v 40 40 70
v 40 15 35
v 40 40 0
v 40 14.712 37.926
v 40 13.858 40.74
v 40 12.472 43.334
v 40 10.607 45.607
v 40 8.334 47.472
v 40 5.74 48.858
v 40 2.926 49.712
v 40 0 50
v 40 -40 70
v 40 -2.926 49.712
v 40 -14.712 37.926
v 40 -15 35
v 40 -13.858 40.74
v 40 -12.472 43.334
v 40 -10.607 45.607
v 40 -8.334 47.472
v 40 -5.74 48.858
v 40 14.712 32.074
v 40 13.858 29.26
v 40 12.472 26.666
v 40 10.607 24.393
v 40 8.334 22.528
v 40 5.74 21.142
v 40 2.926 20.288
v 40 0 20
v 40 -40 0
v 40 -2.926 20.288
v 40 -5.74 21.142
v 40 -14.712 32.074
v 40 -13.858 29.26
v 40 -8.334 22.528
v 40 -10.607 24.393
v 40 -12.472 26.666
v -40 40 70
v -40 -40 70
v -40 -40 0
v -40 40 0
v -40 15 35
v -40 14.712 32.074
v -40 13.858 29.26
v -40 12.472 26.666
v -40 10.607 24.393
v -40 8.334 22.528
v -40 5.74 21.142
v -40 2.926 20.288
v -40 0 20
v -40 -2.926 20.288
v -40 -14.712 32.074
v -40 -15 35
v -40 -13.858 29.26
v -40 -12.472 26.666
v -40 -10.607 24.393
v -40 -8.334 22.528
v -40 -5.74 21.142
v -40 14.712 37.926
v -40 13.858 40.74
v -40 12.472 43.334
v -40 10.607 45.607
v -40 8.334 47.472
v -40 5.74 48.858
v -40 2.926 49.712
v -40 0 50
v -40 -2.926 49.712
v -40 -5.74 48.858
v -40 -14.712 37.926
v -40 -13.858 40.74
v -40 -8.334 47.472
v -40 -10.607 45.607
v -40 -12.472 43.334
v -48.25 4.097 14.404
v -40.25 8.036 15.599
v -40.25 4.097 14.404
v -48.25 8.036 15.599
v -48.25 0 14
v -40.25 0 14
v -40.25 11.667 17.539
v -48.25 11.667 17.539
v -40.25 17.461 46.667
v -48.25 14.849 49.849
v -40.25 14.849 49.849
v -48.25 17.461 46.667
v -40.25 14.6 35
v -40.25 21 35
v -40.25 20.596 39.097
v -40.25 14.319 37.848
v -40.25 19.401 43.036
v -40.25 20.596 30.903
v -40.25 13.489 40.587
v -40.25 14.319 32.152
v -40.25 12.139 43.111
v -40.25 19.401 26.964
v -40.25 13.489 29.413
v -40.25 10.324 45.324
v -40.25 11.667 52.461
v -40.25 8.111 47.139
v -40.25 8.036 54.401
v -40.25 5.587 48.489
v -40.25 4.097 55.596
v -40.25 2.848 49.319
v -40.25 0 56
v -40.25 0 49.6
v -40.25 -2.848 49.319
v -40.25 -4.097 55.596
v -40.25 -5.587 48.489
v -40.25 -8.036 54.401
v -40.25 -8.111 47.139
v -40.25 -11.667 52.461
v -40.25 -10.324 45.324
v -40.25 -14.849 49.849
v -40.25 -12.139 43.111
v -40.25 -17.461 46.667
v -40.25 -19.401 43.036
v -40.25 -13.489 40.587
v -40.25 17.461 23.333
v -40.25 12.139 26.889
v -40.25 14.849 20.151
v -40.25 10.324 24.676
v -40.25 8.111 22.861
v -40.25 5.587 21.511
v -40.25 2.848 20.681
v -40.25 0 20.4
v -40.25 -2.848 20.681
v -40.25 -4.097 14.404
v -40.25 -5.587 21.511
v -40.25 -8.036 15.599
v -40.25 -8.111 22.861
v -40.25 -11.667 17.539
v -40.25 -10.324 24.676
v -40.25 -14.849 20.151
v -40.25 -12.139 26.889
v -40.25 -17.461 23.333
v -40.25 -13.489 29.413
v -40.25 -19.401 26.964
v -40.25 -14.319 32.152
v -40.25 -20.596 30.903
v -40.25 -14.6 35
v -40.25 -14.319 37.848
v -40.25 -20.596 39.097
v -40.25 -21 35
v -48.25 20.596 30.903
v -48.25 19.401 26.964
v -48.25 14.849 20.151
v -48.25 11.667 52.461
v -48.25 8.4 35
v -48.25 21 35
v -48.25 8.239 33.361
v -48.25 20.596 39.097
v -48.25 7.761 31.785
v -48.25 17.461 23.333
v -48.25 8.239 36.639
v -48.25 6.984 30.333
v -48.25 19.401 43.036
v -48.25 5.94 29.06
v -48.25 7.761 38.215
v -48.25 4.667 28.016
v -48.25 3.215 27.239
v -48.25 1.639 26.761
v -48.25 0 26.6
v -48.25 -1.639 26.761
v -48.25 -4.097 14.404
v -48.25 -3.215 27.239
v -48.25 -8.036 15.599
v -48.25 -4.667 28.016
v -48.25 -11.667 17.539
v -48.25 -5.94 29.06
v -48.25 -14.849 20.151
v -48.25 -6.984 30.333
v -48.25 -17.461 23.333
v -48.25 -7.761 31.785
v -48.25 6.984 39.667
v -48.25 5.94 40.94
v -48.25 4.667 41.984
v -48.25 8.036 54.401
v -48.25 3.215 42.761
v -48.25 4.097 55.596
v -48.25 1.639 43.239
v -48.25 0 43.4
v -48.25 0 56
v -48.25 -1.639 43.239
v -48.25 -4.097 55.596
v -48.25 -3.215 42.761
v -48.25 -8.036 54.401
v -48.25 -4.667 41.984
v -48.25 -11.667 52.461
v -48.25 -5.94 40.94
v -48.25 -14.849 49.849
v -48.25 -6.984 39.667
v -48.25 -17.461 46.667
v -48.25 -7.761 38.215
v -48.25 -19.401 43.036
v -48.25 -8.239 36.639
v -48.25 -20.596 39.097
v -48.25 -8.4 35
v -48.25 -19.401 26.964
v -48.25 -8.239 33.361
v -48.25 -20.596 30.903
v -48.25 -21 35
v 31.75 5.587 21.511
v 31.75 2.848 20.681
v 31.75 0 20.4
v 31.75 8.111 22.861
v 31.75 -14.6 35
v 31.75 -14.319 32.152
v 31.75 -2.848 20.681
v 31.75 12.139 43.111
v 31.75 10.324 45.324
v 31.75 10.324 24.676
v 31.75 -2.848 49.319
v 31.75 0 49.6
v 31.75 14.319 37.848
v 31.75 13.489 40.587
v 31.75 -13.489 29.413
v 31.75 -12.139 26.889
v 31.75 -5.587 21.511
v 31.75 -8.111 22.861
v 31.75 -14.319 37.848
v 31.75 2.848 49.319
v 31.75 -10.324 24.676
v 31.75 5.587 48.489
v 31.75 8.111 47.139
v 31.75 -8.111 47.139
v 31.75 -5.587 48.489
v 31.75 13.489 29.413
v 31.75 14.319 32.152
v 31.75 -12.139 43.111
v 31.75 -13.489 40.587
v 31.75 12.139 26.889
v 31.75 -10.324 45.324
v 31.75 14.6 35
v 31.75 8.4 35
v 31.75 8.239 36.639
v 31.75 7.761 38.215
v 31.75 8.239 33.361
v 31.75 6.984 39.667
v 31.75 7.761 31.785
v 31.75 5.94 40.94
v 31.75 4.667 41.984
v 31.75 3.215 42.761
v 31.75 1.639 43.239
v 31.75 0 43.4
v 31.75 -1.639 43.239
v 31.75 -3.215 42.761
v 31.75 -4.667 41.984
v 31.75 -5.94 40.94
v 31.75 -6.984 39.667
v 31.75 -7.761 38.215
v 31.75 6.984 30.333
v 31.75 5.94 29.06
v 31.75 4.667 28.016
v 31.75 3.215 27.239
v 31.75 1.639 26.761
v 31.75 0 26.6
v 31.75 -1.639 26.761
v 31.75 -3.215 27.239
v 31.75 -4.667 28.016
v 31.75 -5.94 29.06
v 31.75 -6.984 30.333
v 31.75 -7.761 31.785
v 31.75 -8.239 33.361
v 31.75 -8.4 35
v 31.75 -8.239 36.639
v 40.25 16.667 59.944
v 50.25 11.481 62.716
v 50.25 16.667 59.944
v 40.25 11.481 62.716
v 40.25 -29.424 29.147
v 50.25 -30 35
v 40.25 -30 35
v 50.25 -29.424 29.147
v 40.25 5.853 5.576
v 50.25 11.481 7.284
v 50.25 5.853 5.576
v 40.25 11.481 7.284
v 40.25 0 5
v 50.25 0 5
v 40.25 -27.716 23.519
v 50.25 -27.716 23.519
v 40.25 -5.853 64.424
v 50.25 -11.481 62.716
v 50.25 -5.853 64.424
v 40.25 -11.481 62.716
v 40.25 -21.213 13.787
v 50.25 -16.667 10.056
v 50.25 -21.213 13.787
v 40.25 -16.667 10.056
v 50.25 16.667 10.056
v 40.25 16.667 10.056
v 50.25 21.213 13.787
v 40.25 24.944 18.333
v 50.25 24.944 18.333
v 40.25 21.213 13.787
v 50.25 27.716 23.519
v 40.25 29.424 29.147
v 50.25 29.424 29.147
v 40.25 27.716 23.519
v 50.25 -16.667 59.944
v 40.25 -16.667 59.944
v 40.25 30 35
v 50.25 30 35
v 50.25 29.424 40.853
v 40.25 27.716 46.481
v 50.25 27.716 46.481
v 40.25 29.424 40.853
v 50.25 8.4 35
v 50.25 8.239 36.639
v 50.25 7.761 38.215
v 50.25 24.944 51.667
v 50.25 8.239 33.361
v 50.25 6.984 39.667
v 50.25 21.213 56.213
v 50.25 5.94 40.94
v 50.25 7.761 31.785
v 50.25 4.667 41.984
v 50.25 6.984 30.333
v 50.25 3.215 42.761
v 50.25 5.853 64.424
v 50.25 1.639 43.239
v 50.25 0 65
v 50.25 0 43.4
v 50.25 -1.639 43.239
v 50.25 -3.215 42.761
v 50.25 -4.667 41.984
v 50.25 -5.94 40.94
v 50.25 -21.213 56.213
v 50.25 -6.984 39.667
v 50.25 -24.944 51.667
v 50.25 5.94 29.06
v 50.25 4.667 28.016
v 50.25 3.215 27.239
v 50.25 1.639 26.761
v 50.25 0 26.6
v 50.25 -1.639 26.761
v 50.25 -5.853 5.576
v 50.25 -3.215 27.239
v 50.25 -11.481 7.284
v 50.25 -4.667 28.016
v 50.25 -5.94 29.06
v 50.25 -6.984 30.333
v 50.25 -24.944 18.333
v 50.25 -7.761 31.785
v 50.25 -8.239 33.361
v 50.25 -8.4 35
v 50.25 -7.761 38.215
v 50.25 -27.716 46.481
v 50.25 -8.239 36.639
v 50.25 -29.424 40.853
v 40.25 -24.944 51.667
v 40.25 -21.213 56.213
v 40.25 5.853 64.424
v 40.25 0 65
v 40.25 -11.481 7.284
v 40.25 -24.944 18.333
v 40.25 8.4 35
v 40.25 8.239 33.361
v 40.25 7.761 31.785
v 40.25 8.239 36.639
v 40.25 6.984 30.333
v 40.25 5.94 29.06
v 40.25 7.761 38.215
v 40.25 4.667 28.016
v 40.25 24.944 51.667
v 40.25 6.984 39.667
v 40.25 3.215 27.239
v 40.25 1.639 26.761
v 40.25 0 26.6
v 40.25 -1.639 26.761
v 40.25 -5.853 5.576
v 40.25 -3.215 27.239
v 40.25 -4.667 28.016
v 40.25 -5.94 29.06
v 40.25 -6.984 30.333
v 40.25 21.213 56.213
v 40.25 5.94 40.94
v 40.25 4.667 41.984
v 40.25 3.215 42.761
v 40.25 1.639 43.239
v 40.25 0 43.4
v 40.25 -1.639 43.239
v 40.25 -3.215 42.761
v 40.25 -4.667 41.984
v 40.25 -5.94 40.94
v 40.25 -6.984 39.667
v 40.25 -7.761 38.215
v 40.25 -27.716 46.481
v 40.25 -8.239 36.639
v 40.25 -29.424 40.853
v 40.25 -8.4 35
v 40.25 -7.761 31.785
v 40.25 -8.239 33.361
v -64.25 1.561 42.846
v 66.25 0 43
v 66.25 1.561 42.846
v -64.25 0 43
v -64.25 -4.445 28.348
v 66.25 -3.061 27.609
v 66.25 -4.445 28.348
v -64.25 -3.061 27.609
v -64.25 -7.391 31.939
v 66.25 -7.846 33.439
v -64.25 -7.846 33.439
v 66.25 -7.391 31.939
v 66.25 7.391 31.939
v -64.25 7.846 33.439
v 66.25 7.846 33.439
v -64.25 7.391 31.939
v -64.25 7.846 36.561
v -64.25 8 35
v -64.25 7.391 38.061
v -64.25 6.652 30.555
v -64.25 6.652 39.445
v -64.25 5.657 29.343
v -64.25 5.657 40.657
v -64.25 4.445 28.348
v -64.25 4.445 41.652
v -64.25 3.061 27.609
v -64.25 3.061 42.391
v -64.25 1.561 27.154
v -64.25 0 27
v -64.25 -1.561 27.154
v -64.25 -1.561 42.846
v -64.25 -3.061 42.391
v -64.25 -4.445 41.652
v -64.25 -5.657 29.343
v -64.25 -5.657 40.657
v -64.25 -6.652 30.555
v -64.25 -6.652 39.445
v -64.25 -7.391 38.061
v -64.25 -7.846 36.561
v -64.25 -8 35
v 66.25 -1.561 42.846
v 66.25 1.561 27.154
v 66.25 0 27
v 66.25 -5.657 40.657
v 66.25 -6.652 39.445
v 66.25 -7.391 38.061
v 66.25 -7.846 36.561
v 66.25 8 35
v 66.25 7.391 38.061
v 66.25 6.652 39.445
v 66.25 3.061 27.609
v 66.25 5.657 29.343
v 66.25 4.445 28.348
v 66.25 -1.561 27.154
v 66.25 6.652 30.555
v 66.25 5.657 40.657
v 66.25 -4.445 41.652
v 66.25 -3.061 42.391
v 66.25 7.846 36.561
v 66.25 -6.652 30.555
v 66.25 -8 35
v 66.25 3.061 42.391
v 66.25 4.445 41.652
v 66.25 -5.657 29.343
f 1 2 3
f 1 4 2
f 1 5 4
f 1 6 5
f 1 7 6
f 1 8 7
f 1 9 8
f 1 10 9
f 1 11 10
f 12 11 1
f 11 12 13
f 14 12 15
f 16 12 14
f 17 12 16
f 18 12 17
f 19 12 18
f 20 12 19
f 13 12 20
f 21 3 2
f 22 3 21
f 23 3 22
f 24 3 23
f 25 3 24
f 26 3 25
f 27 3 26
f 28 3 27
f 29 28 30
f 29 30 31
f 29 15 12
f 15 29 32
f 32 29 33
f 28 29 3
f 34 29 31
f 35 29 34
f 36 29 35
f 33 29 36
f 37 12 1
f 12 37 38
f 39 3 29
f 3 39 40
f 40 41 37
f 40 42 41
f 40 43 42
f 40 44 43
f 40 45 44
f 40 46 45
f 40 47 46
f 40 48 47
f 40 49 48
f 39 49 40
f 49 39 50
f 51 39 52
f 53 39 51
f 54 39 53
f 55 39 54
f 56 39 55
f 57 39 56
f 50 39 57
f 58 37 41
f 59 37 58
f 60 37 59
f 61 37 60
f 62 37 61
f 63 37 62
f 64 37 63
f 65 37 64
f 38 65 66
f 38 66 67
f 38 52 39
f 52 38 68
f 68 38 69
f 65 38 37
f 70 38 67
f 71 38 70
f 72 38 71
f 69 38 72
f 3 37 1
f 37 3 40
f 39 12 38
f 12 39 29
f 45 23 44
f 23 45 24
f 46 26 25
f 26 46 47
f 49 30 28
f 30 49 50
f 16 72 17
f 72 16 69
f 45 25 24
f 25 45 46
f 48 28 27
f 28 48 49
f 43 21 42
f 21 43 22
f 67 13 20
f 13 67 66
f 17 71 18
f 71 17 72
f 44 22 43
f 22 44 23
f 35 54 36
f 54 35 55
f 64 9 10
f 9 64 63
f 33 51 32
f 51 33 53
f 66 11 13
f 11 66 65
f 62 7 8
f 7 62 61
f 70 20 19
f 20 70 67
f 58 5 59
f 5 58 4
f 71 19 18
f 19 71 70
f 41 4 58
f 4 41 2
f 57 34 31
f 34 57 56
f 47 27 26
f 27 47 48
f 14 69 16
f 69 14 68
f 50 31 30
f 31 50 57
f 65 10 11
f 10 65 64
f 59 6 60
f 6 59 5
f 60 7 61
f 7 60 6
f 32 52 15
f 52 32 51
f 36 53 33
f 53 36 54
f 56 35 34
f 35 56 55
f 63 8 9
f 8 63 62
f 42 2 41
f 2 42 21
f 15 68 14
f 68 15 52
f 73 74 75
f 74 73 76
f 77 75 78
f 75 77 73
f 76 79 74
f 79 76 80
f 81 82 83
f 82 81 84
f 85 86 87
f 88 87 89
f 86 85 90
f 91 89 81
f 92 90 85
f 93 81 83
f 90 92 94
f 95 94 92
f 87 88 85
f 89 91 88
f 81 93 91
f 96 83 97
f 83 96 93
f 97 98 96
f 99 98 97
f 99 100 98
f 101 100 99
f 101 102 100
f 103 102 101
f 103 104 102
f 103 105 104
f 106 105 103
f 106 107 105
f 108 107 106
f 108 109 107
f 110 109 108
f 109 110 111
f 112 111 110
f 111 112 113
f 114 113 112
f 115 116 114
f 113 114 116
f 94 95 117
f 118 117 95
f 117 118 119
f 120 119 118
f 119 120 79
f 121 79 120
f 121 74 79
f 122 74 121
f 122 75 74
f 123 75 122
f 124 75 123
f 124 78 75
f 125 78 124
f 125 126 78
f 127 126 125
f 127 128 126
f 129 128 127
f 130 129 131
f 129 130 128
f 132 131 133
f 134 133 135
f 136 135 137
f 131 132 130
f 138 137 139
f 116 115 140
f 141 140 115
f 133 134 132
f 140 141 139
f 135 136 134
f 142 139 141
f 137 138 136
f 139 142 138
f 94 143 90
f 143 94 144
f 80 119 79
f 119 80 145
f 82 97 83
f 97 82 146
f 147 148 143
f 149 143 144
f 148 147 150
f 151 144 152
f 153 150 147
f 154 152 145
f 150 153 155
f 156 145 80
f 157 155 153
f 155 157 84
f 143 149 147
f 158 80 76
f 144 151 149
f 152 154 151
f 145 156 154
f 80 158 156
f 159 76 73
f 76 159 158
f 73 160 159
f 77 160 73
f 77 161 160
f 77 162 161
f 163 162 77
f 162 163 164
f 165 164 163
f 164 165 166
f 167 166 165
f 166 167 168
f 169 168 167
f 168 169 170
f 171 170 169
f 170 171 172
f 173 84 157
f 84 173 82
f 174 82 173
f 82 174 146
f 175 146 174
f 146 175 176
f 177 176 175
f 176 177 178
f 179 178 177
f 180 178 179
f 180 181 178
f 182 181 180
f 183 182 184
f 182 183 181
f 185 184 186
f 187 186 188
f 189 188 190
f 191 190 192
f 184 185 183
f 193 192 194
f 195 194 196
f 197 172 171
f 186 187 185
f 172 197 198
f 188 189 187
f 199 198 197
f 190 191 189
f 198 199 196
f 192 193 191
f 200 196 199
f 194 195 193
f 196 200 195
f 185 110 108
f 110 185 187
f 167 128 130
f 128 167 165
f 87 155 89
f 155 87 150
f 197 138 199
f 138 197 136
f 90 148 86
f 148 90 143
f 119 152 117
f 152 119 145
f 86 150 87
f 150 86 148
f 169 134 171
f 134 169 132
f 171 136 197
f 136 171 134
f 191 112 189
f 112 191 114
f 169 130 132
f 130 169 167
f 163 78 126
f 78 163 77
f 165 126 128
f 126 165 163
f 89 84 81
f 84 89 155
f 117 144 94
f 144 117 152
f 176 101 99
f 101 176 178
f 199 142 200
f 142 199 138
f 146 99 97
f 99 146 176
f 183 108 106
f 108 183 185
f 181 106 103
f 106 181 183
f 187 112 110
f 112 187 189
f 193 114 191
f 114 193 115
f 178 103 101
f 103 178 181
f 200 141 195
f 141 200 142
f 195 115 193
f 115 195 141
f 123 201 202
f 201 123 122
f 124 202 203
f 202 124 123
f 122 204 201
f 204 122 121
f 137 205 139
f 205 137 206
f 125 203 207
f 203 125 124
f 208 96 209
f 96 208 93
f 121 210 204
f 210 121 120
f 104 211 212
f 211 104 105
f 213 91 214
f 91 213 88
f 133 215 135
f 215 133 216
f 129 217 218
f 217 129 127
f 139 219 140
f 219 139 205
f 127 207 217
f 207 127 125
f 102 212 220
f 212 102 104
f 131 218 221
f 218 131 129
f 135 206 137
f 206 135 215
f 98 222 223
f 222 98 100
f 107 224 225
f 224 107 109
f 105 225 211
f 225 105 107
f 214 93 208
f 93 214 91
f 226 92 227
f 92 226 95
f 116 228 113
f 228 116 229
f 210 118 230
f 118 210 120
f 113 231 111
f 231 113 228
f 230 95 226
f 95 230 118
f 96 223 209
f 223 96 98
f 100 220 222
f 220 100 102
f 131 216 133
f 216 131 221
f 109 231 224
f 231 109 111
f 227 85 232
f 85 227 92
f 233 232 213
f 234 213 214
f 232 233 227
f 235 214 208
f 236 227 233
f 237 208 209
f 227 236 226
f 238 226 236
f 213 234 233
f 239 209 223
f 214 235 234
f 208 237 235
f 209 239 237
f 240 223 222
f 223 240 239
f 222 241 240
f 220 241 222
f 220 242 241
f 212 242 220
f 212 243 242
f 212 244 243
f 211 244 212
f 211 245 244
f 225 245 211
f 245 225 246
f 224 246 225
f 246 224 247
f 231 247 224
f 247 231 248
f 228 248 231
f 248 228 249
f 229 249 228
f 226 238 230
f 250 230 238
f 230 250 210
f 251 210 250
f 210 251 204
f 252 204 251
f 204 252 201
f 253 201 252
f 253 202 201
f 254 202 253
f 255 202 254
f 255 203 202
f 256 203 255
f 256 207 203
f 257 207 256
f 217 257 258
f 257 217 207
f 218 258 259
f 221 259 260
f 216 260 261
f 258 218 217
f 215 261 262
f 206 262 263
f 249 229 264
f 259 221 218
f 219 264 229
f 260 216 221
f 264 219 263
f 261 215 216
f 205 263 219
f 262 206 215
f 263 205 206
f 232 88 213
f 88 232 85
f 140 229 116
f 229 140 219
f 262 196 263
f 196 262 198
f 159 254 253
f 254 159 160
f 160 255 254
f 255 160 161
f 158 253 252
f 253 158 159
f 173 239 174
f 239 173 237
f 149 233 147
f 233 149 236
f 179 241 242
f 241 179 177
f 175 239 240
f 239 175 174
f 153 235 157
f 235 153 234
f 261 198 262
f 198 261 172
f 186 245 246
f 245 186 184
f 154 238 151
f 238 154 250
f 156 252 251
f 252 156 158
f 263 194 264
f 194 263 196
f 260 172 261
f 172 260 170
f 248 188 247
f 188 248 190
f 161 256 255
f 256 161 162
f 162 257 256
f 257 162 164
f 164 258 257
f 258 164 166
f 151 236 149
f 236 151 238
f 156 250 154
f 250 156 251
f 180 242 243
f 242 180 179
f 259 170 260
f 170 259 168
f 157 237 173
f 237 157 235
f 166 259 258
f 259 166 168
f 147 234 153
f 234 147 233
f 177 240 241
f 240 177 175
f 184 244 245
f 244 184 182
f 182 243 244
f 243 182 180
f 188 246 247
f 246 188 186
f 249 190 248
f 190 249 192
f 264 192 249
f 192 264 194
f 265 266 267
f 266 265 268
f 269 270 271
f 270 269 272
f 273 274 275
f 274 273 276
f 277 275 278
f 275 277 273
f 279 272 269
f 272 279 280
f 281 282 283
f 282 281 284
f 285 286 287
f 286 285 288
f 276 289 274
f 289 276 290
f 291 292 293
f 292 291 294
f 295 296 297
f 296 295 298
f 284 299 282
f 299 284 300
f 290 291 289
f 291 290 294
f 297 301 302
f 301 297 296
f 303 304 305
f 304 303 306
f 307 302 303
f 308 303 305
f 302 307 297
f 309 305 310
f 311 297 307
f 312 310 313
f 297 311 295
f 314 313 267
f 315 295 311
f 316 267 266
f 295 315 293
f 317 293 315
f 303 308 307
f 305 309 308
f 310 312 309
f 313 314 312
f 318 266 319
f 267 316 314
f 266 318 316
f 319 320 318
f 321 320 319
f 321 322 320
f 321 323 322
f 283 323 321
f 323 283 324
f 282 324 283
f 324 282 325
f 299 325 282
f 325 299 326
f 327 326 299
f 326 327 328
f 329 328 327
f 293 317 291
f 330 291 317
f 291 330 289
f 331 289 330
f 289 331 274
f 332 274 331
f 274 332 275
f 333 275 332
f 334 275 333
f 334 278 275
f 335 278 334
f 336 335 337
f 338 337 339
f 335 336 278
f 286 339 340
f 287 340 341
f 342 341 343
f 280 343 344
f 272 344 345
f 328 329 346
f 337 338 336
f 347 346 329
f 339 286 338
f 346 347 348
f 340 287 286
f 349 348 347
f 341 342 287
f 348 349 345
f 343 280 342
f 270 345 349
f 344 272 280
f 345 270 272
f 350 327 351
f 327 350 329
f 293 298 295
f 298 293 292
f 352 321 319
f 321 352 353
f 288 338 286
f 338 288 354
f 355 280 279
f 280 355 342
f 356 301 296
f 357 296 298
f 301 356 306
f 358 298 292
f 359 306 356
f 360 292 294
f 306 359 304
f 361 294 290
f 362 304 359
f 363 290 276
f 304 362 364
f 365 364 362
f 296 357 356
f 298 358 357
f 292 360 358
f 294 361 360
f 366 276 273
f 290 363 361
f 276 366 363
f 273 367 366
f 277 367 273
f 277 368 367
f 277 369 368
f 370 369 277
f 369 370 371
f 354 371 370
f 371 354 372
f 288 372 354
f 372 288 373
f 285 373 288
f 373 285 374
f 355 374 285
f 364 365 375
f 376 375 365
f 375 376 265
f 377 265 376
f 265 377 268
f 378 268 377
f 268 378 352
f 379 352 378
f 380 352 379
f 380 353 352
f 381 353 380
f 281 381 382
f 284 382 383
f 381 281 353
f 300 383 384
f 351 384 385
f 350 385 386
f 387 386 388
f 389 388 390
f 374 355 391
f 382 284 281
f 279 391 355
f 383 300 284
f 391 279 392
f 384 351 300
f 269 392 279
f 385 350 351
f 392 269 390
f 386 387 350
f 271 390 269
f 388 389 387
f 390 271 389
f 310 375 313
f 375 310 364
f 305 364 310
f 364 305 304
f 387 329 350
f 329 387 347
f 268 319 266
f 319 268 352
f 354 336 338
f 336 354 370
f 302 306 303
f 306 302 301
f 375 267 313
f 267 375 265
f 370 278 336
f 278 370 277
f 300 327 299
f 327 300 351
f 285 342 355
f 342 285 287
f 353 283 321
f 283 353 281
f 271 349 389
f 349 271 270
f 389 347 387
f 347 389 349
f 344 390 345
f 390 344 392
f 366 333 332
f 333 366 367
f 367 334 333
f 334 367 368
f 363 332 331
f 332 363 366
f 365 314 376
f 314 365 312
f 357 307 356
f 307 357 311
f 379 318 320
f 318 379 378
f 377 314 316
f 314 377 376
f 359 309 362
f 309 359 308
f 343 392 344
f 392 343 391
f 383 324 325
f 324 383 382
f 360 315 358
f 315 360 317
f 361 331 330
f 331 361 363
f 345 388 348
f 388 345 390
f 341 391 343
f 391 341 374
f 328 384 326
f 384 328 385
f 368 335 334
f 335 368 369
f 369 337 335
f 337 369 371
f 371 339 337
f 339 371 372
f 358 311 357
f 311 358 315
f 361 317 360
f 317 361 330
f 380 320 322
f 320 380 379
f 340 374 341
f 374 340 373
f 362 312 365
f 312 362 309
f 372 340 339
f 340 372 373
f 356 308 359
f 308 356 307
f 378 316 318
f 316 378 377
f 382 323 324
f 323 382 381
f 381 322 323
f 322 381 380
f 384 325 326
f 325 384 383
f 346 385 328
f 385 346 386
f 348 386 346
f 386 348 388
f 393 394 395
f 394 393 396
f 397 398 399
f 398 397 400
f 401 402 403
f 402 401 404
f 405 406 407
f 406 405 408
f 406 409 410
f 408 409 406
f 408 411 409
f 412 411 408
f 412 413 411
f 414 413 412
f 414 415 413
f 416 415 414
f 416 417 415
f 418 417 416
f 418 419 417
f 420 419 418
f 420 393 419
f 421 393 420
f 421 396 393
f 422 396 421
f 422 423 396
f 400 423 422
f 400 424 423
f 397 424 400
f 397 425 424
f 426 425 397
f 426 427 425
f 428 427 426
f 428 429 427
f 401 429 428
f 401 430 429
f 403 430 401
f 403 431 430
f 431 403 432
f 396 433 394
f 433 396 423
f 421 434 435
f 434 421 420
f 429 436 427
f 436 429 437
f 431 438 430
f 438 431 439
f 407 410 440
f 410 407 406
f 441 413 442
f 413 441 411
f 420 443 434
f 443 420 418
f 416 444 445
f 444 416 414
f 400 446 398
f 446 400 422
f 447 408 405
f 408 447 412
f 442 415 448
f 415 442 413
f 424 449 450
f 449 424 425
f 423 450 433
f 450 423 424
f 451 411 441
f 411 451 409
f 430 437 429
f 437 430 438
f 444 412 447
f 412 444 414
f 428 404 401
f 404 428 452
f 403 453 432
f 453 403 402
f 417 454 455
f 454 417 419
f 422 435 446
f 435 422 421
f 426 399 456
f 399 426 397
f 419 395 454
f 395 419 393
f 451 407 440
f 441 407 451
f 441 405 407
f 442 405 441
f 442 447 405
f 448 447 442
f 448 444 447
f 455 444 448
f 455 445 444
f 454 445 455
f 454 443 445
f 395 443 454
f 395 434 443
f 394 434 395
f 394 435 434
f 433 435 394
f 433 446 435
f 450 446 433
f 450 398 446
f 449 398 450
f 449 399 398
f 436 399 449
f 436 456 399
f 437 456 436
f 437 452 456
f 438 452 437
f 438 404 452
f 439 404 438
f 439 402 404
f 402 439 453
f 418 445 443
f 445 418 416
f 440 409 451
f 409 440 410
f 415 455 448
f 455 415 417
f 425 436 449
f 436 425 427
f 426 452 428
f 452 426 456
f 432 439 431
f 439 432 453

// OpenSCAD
$fn = 32;

// ------------------------------------------------------------------------
// Bushed housing: 80 x 80 x 70 mm housing, bushing d29.2
// Every part is its own module, assembly() places them once.
// ------------------------------------------------------------------------

// --- part 1 ---
module housing() {
  difference() {
    translate([-40, -40, 0]) cube([80, 80, 70]);
    translate([0, 0, 35]) rotate([0, 90, 0]) cylinder(h = 82, d = 30, center = true);
  }
}

// --- part 2 ---
module bushing() {
  difference() {
    union() {
      cylinder(h = 8, d = 42);
      translate([0, 0, 8]) cylinder(h = 72, d = 29.2);
    }
    translate([0, 0, -1]) cylinder(h = 82, d = 16.8);
  }
}

// --- part 3 ---
module shaft() {
  translate([0, 0, -65.25]) cylinder(h = 130.5, d = 16);
}

// --- part 4 ---
module cover() {
  difference() {
    cylinder(h = 10, d = 60);
    translate([0, 0, -1]) cylinder(h = 12, d = 16.8);
  }
}

// --- assembly ---
module assembly() {
  translate([0, 0, 0]) rotate([0, 0, 0]) housing();
  translate([-48.25, 0, 35]) rotate([0, 90, 0]) bushing();
  translate([1, 0, 35]) rotate([0, 90, 0]) shaft();
  translate([40.25, 0, 35]) rotate([0, 90, 0]) cover();
}

assembly();
